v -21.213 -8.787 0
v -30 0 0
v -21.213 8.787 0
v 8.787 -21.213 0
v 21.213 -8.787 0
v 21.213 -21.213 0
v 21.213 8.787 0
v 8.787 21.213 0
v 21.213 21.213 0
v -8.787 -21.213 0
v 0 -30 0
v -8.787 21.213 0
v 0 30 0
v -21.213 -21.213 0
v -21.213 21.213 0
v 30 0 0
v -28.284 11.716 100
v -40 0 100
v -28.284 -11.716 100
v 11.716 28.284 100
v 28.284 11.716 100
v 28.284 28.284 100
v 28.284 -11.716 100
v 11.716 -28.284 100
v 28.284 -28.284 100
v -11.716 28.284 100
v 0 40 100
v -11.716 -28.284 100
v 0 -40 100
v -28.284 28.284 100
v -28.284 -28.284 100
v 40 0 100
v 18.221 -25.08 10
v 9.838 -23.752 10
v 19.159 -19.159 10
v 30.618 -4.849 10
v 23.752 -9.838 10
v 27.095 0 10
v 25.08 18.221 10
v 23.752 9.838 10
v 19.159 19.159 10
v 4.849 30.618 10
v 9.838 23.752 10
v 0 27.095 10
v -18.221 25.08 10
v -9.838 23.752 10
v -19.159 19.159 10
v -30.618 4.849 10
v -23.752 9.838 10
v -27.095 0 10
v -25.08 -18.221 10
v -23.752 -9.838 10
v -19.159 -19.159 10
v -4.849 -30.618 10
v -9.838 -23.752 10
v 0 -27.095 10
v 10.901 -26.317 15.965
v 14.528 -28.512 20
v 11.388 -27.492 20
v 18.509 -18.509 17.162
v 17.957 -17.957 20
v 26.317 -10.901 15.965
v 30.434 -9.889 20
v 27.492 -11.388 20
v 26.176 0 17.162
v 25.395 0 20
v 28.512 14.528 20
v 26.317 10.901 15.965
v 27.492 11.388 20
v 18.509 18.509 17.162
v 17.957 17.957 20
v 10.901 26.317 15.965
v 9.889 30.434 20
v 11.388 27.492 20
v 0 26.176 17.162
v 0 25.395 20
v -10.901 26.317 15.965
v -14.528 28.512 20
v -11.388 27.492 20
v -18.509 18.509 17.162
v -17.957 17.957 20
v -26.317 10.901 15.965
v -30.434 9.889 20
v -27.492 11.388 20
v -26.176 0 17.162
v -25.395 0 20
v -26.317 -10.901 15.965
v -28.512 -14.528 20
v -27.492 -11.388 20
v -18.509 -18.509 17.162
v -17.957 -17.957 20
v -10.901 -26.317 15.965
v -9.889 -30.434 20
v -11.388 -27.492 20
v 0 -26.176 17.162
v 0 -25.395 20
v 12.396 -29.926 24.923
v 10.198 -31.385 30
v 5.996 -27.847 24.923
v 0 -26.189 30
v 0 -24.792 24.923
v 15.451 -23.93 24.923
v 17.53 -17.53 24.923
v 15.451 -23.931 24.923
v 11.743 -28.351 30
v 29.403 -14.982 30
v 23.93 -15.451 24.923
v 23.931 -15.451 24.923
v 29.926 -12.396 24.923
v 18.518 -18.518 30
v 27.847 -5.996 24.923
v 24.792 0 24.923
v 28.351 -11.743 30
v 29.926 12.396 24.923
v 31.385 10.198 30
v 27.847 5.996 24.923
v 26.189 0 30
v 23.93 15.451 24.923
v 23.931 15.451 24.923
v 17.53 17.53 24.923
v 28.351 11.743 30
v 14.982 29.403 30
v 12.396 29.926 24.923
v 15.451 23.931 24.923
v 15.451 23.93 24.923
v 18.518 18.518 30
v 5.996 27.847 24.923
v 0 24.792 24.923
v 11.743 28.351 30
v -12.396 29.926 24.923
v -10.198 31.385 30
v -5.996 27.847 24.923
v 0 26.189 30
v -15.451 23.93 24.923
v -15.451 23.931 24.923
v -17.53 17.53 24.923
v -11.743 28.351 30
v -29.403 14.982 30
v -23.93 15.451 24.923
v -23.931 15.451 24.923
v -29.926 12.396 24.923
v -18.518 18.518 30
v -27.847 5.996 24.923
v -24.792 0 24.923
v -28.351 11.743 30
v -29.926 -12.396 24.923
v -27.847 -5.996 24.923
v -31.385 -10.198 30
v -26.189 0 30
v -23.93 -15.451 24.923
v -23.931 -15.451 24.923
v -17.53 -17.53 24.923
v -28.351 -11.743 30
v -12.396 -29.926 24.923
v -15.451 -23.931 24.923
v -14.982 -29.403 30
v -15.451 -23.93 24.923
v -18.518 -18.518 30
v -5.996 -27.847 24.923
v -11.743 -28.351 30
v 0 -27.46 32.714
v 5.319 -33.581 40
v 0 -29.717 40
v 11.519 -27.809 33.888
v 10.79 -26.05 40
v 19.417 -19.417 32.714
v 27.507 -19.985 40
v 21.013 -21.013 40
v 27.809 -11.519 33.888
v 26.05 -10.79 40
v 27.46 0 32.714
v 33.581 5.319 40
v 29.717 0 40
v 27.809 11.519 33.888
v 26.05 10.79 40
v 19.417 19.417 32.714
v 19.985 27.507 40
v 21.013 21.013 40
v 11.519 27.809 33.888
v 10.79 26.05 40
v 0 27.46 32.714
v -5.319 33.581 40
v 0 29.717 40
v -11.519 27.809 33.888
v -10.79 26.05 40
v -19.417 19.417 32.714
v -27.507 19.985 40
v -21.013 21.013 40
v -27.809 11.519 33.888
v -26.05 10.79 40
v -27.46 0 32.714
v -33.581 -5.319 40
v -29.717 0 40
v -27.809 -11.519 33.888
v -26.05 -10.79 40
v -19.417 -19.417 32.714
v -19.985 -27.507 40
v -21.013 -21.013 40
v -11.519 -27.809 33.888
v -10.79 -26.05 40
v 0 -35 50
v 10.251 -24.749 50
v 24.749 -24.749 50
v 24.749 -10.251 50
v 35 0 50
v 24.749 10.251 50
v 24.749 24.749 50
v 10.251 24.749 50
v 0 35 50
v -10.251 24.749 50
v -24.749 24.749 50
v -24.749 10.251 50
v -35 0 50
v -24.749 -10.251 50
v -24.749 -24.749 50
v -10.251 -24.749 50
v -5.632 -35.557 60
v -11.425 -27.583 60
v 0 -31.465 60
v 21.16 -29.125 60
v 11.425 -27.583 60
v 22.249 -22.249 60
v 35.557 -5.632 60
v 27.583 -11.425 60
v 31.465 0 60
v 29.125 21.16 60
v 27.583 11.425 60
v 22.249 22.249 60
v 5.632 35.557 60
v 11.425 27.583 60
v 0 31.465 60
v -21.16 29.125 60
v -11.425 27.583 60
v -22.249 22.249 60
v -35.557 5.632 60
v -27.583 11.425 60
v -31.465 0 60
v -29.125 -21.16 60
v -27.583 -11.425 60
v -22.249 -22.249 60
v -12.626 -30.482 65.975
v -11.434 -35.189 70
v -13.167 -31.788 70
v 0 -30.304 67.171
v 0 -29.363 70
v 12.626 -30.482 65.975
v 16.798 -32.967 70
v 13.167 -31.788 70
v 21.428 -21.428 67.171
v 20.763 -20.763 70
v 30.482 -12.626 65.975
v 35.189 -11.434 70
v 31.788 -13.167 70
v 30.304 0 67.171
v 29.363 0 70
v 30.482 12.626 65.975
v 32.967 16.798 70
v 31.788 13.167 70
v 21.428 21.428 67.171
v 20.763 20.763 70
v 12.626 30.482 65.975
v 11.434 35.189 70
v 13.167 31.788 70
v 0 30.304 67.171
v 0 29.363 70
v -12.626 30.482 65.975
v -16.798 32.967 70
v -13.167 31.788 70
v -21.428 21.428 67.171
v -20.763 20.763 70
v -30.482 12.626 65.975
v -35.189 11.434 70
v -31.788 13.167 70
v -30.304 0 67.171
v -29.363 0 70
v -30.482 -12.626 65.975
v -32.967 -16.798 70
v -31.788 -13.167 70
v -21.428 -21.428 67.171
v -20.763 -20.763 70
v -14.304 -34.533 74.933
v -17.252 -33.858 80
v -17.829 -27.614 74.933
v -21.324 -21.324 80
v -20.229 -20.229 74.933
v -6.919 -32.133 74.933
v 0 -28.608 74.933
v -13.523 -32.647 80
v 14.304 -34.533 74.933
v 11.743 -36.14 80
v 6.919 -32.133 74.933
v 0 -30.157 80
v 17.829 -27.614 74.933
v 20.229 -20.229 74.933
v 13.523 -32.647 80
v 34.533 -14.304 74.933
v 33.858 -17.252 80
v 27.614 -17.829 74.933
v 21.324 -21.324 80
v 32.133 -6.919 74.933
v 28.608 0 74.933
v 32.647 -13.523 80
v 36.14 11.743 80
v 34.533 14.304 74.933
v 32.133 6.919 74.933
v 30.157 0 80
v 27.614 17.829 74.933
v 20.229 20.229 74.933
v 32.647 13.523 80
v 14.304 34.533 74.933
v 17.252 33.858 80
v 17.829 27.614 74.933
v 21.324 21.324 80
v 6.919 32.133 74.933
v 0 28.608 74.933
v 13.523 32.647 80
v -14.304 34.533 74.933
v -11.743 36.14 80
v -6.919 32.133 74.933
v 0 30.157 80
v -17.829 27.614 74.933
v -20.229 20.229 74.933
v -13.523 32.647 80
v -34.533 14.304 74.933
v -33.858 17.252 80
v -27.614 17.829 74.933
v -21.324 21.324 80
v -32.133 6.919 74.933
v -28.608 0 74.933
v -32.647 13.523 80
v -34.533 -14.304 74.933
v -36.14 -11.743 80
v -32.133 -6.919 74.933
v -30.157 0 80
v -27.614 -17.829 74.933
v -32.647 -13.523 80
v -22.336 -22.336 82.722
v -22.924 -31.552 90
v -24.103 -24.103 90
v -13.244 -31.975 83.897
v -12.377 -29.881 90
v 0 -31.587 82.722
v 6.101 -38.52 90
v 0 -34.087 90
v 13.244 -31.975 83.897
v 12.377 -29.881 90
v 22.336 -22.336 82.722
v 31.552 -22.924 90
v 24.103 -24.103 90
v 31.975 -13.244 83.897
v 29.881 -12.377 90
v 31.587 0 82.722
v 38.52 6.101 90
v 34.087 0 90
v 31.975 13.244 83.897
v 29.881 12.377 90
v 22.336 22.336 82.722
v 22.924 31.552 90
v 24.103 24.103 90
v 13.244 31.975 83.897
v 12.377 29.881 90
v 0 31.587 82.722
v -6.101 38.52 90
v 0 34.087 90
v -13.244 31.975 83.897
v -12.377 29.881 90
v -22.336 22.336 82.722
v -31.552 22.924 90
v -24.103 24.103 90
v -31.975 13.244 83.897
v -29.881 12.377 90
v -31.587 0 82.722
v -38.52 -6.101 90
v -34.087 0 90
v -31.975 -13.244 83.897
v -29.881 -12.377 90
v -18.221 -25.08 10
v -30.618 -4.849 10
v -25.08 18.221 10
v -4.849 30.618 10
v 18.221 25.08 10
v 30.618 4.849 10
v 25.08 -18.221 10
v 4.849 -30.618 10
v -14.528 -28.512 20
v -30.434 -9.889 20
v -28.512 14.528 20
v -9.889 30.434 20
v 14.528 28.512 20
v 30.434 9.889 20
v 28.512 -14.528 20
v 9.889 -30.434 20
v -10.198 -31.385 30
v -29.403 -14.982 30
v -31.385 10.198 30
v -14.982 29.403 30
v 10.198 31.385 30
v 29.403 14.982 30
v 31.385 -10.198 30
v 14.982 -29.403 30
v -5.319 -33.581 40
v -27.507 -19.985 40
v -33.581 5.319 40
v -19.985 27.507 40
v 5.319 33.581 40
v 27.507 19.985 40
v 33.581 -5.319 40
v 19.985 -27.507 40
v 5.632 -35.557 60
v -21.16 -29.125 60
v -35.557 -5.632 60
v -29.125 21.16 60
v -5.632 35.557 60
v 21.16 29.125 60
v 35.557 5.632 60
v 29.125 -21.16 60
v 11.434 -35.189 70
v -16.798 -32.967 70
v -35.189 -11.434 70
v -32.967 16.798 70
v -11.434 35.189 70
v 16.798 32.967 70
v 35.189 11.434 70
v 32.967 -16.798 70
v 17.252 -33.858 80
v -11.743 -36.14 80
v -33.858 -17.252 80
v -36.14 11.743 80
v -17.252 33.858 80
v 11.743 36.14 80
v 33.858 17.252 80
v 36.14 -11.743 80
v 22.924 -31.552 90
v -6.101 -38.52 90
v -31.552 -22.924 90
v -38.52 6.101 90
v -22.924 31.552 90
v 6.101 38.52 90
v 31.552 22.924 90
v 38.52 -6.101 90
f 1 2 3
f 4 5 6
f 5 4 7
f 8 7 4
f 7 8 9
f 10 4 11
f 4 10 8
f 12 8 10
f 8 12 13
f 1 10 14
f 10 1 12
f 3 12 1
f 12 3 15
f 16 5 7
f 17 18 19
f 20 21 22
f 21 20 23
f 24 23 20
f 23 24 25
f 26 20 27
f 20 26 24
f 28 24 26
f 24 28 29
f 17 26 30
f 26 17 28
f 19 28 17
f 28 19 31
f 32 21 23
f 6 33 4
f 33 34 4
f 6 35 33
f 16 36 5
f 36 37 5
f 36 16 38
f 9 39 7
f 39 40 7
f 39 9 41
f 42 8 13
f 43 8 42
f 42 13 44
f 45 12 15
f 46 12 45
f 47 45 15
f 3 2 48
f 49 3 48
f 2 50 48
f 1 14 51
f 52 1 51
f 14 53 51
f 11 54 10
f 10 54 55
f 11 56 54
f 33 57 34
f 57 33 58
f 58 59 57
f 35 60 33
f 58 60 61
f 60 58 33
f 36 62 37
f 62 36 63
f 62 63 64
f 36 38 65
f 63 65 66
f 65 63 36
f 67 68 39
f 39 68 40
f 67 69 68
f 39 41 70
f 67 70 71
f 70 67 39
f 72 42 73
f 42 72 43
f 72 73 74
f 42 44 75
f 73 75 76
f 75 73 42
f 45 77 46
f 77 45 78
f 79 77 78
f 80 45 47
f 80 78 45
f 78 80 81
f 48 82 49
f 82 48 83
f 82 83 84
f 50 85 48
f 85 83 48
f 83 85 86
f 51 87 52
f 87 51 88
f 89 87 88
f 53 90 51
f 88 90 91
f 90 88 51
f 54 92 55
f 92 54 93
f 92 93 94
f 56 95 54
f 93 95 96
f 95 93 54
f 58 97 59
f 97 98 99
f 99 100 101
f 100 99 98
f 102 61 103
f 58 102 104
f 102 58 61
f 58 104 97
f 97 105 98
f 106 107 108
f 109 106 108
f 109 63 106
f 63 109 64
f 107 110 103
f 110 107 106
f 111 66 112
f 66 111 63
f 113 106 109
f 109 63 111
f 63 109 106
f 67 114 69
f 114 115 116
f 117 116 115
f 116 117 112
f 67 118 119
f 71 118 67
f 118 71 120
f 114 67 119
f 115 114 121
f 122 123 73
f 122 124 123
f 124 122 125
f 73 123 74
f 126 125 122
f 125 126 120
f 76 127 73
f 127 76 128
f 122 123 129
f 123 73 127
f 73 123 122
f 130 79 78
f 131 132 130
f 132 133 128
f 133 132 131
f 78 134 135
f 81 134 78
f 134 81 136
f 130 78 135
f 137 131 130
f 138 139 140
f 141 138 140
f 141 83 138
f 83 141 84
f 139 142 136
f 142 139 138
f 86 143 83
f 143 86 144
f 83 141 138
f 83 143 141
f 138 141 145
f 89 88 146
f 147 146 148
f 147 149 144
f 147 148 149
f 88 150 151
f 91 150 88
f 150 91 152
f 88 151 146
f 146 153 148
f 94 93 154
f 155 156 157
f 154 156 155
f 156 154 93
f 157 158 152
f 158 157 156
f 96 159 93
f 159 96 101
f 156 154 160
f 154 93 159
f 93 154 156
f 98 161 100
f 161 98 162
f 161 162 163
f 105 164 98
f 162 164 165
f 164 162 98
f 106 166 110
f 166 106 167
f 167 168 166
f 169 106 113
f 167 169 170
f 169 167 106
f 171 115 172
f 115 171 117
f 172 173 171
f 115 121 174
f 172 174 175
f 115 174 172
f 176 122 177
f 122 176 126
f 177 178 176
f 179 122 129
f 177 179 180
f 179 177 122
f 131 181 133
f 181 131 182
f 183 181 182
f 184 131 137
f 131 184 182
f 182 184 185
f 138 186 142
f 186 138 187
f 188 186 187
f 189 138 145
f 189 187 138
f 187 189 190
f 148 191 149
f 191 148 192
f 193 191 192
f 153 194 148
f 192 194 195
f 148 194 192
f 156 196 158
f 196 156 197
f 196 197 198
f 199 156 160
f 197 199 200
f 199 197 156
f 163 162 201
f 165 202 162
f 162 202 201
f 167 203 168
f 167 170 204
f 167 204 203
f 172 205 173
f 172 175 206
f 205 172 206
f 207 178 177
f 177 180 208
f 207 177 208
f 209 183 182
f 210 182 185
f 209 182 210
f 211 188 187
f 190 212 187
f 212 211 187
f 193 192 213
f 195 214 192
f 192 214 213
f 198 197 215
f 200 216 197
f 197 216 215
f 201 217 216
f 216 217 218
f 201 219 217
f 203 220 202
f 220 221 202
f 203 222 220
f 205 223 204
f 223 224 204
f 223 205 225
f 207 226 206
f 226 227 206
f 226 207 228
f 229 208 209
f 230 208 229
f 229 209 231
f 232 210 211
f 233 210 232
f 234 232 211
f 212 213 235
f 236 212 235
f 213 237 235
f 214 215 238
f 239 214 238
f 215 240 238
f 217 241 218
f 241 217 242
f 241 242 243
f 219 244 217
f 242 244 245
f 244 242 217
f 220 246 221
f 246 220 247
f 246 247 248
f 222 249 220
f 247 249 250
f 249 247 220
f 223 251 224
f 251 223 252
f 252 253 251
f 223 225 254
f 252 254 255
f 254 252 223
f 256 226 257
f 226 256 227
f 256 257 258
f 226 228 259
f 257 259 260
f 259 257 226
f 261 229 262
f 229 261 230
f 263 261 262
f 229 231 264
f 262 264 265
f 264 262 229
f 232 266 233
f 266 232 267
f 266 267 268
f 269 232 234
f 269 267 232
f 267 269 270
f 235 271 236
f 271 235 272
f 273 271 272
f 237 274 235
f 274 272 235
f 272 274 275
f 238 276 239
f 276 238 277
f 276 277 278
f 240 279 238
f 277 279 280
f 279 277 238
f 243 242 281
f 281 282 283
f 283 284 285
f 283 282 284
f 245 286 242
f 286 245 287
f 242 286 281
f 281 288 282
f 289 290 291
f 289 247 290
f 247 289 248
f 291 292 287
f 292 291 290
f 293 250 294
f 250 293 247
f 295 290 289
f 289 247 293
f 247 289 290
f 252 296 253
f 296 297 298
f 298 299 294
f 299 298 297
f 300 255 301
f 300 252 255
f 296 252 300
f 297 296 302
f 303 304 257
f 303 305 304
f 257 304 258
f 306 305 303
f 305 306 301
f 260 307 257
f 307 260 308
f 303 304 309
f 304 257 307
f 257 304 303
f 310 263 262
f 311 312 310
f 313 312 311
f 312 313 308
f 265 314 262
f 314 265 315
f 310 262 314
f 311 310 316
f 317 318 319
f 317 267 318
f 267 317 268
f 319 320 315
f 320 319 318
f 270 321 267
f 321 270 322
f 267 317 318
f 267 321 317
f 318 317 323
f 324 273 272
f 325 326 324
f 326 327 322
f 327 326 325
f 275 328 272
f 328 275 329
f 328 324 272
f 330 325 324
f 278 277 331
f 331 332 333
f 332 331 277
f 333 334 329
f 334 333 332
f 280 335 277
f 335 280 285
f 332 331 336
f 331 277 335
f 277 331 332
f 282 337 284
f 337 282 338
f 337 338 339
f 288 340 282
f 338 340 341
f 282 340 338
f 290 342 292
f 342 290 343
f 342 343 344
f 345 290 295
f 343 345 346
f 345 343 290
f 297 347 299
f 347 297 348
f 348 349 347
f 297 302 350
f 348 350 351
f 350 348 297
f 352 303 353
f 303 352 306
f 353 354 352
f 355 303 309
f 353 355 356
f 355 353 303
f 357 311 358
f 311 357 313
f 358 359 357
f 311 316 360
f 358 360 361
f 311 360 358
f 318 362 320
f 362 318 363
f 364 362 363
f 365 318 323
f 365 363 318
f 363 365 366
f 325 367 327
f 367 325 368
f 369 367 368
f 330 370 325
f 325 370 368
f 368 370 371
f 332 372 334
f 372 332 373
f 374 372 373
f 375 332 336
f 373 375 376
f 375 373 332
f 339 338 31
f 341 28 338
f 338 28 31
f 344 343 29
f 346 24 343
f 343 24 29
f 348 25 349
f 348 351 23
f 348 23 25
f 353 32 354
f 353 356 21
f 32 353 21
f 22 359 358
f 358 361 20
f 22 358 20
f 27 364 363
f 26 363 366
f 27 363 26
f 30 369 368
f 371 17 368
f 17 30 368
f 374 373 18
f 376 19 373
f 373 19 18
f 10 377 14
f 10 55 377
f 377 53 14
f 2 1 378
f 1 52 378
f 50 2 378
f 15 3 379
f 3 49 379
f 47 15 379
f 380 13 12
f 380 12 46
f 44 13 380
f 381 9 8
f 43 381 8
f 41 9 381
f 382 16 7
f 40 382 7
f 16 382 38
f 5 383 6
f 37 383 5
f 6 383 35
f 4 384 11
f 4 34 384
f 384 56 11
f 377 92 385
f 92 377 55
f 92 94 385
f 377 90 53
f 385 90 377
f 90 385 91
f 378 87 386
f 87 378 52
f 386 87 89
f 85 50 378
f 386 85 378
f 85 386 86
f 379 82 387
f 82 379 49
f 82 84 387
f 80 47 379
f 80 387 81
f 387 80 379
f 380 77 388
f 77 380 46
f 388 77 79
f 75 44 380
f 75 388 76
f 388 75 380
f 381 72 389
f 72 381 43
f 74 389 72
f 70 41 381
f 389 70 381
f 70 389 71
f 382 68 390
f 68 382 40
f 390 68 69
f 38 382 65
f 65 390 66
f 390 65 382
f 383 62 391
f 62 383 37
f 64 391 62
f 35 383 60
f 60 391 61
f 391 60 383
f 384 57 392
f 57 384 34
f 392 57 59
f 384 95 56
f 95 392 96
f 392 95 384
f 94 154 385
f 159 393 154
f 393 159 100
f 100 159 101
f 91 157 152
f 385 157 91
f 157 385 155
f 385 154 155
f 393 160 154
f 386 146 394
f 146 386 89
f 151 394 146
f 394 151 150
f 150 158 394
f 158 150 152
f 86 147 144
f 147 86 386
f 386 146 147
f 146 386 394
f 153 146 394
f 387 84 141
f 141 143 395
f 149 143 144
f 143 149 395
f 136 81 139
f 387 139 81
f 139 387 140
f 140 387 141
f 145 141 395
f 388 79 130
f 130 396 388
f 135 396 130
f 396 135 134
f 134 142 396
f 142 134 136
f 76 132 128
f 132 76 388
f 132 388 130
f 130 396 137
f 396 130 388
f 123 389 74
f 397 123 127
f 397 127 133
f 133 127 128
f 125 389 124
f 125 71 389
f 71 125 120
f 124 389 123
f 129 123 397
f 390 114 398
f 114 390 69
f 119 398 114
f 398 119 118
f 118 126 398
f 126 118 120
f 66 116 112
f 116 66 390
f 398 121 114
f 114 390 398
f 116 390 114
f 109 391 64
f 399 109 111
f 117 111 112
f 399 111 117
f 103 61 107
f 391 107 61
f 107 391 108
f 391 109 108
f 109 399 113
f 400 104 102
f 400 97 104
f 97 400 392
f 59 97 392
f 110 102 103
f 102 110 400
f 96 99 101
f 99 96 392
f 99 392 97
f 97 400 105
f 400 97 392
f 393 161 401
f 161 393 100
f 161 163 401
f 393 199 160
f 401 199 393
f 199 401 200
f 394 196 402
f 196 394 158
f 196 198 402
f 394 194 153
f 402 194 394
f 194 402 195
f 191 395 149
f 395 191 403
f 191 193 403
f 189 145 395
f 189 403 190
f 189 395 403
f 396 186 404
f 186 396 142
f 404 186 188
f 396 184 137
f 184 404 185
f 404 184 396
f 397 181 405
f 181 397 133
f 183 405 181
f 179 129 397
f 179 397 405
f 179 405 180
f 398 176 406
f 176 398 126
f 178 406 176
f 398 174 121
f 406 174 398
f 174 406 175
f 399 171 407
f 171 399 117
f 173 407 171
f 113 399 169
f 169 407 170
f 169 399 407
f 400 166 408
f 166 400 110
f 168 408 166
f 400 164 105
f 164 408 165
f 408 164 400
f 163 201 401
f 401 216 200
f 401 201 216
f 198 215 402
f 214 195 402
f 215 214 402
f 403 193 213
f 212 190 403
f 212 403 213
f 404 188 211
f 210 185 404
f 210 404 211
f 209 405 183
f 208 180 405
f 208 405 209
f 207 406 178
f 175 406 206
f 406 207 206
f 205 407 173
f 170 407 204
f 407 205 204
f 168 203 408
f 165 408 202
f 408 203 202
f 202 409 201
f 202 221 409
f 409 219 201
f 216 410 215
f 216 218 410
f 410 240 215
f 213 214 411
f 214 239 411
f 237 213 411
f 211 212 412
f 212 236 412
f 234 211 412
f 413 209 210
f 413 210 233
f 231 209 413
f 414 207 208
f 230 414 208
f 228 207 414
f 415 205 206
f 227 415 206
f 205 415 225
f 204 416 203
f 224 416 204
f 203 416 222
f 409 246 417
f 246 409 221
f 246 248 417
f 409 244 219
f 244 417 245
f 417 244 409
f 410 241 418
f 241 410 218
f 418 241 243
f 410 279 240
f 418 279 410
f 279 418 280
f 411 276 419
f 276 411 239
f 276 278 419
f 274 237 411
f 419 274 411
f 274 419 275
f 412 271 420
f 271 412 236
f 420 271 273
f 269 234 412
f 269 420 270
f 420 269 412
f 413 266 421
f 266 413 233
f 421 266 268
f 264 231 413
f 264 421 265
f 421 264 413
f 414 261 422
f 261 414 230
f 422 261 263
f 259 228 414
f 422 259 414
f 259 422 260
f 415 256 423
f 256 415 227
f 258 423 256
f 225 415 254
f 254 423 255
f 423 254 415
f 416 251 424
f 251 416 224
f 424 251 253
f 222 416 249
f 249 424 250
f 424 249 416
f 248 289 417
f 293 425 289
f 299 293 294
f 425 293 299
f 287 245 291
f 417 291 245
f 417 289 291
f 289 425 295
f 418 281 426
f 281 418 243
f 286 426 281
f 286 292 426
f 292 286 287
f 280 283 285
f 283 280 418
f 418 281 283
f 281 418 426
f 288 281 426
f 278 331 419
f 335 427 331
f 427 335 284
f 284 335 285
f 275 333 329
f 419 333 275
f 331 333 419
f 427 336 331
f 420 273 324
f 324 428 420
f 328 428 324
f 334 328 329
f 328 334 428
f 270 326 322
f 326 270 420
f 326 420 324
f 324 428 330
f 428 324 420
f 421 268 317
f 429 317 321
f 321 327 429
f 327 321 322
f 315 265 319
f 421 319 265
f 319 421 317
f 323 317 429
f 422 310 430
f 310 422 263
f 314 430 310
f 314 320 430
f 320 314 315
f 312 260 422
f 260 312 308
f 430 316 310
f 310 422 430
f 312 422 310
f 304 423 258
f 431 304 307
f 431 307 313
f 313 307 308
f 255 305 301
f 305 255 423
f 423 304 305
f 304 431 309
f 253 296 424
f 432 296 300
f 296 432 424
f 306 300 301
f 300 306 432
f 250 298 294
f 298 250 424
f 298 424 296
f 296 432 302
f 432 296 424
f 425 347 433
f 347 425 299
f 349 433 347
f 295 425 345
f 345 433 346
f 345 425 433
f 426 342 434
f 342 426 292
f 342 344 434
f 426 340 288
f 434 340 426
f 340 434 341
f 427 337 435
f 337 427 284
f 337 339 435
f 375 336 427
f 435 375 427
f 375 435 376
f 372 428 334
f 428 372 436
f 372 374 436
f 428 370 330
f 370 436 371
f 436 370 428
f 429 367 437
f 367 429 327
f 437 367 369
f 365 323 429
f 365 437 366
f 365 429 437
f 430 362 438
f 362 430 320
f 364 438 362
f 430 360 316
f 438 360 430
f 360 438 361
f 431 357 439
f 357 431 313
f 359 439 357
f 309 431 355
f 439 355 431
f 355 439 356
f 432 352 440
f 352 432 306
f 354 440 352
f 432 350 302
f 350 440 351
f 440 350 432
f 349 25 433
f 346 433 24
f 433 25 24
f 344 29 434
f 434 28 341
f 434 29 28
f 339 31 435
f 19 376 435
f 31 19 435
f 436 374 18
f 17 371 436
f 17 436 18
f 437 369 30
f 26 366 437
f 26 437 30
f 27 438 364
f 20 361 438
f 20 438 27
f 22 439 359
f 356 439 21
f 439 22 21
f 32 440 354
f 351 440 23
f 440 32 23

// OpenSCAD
// max. radius of the base
lower_radius = 30;

// max. radius of the top
upper_radius = 40;

// which shape should be used: 3: triangle, 4: square, 5...
corner_count = 4;

// number of slices 10 ... draft, 1000 ... for printing
slices = 10;

// height of the vase
height = 100;

// how much the vase should be twisted
twist = 90;

// how many objects of shape corner_count should be used
number_of_stars = 2;

// double twisted vase
double = true;

// angle which rotates the second twist
angle = 0;

module base()
{circle(r=lower_radius, $fn=corner_count);
}

module vase(){
linear_extrude(height, twist=twist, slices =slices, scale=upper_radius / lower_radius){
for (i=[0:(360/corner_count/number_of_stars):360/corner_count])
rotate([0,0,i])render()base();}}

render()vase();
if (double)
scale([-1,1,1])rotate([0,0,angle])vase();
